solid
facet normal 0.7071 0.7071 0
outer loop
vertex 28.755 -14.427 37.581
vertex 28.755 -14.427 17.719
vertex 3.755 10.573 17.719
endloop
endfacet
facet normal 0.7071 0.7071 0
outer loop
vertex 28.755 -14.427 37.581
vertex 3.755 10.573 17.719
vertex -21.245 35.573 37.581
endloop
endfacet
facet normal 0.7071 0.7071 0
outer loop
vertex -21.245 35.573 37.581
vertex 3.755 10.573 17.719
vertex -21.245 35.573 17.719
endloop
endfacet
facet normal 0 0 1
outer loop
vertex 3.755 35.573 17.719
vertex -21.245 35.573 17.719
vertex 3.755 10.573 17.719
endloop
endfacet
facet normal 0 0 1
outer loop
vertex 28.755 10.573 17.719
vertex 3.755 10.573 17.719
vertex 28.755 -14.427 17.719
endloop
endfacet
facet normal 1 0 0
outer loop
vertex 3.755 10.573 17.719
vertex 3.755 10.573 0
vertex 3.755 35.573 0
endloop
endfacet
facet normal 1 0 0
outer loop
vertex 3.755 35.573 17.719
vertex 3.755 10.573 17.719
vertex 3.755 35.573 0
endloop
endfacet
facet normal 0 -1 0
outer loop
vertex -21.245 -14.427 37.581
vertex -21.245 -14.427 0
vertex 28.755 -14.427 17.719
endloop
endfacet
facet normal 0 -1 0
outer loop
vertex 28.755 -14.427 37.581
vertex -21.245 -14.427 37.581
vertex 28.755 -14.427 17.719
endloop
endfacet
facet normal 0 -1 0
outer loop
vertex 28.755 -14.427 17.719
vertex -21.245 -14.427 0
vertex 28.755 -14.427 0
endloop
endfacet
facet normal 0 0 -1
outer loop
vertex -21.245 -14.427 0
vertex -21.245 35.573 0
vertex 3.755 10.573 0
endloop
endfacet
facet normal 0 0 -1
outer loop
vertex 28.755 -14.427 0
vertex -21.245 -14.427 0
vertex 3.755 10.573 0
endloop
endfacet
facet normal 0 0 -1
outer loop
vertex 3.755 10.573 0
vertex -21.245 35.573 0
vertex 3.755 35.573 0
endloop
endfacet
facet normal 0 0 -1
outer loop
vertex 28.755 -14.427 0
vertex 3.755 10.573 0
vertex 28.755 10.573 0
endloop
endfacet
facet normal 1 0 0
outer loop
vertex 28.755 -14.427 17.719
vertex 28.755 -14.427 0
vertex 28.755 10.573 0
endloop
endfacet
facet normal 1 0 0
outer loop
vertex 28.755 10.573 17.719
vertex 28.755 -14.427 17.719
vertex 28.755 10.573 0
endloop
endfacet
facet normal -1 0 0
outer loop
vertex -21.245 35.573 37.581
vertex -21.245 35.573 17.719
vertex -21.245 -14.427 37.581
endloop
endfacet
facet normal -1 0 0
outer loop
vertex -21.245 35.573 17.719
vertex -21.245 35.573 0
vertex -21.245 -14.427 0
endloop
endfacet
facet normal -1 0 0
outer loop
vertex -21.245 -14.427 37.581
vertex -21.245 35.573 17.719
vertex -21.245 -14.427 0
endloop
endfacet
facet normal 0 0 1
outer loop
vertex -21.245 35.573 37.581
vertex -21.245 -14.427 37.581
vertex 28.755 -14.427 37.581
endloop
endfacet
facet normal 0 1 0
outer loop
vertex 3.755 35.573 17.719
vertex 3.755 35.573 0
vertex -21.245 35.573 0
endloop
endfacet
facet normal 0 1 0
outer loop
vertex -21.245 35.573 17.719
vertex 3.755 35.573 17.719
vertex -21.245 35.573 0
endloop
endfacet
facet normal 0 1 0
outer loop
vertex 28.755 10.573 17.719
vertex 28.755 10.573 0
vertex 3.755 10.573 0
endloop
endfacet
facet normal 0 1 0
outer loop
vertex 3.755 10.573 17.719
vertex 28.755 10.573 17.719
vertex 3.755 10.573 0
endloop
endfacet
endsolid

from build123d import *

# Parameters (mm, degrees)
BOSS_EXTRUDE3_DEPTH = 37.581213244
BOSS_EXTRUDE4_DEPTH = 17.71872424


with BuildPart() as part:
    # Sketch1 → Boss-Extrude3 (new body)
    with BuildSketch(Plane.XY):
        Polygon((-21.245059289, 35.57312253), (-21.245059289, -14.42687747), (28.754940711, -14.42687747), align=None)
    extrude(amount=BOSS_EXTRUDE3_DEPTH)

    # Sketch1<9> → Boss-Extrude4 (add)
    with BuildSketch(Plane.XY):
        Polygon((3.754940711, 35.57312253), (-21.245059289, 35.57312253), (3.754940711, 10.57312253), align=None)
        Polygon((28.754940711, 10.57312253), (3.754940711, 10.57312253), (28.754940711, -14.42687747), align=None)
    extrude(amount=BOSS_EXTRUDE4_DEPTH)


solid = part.part
